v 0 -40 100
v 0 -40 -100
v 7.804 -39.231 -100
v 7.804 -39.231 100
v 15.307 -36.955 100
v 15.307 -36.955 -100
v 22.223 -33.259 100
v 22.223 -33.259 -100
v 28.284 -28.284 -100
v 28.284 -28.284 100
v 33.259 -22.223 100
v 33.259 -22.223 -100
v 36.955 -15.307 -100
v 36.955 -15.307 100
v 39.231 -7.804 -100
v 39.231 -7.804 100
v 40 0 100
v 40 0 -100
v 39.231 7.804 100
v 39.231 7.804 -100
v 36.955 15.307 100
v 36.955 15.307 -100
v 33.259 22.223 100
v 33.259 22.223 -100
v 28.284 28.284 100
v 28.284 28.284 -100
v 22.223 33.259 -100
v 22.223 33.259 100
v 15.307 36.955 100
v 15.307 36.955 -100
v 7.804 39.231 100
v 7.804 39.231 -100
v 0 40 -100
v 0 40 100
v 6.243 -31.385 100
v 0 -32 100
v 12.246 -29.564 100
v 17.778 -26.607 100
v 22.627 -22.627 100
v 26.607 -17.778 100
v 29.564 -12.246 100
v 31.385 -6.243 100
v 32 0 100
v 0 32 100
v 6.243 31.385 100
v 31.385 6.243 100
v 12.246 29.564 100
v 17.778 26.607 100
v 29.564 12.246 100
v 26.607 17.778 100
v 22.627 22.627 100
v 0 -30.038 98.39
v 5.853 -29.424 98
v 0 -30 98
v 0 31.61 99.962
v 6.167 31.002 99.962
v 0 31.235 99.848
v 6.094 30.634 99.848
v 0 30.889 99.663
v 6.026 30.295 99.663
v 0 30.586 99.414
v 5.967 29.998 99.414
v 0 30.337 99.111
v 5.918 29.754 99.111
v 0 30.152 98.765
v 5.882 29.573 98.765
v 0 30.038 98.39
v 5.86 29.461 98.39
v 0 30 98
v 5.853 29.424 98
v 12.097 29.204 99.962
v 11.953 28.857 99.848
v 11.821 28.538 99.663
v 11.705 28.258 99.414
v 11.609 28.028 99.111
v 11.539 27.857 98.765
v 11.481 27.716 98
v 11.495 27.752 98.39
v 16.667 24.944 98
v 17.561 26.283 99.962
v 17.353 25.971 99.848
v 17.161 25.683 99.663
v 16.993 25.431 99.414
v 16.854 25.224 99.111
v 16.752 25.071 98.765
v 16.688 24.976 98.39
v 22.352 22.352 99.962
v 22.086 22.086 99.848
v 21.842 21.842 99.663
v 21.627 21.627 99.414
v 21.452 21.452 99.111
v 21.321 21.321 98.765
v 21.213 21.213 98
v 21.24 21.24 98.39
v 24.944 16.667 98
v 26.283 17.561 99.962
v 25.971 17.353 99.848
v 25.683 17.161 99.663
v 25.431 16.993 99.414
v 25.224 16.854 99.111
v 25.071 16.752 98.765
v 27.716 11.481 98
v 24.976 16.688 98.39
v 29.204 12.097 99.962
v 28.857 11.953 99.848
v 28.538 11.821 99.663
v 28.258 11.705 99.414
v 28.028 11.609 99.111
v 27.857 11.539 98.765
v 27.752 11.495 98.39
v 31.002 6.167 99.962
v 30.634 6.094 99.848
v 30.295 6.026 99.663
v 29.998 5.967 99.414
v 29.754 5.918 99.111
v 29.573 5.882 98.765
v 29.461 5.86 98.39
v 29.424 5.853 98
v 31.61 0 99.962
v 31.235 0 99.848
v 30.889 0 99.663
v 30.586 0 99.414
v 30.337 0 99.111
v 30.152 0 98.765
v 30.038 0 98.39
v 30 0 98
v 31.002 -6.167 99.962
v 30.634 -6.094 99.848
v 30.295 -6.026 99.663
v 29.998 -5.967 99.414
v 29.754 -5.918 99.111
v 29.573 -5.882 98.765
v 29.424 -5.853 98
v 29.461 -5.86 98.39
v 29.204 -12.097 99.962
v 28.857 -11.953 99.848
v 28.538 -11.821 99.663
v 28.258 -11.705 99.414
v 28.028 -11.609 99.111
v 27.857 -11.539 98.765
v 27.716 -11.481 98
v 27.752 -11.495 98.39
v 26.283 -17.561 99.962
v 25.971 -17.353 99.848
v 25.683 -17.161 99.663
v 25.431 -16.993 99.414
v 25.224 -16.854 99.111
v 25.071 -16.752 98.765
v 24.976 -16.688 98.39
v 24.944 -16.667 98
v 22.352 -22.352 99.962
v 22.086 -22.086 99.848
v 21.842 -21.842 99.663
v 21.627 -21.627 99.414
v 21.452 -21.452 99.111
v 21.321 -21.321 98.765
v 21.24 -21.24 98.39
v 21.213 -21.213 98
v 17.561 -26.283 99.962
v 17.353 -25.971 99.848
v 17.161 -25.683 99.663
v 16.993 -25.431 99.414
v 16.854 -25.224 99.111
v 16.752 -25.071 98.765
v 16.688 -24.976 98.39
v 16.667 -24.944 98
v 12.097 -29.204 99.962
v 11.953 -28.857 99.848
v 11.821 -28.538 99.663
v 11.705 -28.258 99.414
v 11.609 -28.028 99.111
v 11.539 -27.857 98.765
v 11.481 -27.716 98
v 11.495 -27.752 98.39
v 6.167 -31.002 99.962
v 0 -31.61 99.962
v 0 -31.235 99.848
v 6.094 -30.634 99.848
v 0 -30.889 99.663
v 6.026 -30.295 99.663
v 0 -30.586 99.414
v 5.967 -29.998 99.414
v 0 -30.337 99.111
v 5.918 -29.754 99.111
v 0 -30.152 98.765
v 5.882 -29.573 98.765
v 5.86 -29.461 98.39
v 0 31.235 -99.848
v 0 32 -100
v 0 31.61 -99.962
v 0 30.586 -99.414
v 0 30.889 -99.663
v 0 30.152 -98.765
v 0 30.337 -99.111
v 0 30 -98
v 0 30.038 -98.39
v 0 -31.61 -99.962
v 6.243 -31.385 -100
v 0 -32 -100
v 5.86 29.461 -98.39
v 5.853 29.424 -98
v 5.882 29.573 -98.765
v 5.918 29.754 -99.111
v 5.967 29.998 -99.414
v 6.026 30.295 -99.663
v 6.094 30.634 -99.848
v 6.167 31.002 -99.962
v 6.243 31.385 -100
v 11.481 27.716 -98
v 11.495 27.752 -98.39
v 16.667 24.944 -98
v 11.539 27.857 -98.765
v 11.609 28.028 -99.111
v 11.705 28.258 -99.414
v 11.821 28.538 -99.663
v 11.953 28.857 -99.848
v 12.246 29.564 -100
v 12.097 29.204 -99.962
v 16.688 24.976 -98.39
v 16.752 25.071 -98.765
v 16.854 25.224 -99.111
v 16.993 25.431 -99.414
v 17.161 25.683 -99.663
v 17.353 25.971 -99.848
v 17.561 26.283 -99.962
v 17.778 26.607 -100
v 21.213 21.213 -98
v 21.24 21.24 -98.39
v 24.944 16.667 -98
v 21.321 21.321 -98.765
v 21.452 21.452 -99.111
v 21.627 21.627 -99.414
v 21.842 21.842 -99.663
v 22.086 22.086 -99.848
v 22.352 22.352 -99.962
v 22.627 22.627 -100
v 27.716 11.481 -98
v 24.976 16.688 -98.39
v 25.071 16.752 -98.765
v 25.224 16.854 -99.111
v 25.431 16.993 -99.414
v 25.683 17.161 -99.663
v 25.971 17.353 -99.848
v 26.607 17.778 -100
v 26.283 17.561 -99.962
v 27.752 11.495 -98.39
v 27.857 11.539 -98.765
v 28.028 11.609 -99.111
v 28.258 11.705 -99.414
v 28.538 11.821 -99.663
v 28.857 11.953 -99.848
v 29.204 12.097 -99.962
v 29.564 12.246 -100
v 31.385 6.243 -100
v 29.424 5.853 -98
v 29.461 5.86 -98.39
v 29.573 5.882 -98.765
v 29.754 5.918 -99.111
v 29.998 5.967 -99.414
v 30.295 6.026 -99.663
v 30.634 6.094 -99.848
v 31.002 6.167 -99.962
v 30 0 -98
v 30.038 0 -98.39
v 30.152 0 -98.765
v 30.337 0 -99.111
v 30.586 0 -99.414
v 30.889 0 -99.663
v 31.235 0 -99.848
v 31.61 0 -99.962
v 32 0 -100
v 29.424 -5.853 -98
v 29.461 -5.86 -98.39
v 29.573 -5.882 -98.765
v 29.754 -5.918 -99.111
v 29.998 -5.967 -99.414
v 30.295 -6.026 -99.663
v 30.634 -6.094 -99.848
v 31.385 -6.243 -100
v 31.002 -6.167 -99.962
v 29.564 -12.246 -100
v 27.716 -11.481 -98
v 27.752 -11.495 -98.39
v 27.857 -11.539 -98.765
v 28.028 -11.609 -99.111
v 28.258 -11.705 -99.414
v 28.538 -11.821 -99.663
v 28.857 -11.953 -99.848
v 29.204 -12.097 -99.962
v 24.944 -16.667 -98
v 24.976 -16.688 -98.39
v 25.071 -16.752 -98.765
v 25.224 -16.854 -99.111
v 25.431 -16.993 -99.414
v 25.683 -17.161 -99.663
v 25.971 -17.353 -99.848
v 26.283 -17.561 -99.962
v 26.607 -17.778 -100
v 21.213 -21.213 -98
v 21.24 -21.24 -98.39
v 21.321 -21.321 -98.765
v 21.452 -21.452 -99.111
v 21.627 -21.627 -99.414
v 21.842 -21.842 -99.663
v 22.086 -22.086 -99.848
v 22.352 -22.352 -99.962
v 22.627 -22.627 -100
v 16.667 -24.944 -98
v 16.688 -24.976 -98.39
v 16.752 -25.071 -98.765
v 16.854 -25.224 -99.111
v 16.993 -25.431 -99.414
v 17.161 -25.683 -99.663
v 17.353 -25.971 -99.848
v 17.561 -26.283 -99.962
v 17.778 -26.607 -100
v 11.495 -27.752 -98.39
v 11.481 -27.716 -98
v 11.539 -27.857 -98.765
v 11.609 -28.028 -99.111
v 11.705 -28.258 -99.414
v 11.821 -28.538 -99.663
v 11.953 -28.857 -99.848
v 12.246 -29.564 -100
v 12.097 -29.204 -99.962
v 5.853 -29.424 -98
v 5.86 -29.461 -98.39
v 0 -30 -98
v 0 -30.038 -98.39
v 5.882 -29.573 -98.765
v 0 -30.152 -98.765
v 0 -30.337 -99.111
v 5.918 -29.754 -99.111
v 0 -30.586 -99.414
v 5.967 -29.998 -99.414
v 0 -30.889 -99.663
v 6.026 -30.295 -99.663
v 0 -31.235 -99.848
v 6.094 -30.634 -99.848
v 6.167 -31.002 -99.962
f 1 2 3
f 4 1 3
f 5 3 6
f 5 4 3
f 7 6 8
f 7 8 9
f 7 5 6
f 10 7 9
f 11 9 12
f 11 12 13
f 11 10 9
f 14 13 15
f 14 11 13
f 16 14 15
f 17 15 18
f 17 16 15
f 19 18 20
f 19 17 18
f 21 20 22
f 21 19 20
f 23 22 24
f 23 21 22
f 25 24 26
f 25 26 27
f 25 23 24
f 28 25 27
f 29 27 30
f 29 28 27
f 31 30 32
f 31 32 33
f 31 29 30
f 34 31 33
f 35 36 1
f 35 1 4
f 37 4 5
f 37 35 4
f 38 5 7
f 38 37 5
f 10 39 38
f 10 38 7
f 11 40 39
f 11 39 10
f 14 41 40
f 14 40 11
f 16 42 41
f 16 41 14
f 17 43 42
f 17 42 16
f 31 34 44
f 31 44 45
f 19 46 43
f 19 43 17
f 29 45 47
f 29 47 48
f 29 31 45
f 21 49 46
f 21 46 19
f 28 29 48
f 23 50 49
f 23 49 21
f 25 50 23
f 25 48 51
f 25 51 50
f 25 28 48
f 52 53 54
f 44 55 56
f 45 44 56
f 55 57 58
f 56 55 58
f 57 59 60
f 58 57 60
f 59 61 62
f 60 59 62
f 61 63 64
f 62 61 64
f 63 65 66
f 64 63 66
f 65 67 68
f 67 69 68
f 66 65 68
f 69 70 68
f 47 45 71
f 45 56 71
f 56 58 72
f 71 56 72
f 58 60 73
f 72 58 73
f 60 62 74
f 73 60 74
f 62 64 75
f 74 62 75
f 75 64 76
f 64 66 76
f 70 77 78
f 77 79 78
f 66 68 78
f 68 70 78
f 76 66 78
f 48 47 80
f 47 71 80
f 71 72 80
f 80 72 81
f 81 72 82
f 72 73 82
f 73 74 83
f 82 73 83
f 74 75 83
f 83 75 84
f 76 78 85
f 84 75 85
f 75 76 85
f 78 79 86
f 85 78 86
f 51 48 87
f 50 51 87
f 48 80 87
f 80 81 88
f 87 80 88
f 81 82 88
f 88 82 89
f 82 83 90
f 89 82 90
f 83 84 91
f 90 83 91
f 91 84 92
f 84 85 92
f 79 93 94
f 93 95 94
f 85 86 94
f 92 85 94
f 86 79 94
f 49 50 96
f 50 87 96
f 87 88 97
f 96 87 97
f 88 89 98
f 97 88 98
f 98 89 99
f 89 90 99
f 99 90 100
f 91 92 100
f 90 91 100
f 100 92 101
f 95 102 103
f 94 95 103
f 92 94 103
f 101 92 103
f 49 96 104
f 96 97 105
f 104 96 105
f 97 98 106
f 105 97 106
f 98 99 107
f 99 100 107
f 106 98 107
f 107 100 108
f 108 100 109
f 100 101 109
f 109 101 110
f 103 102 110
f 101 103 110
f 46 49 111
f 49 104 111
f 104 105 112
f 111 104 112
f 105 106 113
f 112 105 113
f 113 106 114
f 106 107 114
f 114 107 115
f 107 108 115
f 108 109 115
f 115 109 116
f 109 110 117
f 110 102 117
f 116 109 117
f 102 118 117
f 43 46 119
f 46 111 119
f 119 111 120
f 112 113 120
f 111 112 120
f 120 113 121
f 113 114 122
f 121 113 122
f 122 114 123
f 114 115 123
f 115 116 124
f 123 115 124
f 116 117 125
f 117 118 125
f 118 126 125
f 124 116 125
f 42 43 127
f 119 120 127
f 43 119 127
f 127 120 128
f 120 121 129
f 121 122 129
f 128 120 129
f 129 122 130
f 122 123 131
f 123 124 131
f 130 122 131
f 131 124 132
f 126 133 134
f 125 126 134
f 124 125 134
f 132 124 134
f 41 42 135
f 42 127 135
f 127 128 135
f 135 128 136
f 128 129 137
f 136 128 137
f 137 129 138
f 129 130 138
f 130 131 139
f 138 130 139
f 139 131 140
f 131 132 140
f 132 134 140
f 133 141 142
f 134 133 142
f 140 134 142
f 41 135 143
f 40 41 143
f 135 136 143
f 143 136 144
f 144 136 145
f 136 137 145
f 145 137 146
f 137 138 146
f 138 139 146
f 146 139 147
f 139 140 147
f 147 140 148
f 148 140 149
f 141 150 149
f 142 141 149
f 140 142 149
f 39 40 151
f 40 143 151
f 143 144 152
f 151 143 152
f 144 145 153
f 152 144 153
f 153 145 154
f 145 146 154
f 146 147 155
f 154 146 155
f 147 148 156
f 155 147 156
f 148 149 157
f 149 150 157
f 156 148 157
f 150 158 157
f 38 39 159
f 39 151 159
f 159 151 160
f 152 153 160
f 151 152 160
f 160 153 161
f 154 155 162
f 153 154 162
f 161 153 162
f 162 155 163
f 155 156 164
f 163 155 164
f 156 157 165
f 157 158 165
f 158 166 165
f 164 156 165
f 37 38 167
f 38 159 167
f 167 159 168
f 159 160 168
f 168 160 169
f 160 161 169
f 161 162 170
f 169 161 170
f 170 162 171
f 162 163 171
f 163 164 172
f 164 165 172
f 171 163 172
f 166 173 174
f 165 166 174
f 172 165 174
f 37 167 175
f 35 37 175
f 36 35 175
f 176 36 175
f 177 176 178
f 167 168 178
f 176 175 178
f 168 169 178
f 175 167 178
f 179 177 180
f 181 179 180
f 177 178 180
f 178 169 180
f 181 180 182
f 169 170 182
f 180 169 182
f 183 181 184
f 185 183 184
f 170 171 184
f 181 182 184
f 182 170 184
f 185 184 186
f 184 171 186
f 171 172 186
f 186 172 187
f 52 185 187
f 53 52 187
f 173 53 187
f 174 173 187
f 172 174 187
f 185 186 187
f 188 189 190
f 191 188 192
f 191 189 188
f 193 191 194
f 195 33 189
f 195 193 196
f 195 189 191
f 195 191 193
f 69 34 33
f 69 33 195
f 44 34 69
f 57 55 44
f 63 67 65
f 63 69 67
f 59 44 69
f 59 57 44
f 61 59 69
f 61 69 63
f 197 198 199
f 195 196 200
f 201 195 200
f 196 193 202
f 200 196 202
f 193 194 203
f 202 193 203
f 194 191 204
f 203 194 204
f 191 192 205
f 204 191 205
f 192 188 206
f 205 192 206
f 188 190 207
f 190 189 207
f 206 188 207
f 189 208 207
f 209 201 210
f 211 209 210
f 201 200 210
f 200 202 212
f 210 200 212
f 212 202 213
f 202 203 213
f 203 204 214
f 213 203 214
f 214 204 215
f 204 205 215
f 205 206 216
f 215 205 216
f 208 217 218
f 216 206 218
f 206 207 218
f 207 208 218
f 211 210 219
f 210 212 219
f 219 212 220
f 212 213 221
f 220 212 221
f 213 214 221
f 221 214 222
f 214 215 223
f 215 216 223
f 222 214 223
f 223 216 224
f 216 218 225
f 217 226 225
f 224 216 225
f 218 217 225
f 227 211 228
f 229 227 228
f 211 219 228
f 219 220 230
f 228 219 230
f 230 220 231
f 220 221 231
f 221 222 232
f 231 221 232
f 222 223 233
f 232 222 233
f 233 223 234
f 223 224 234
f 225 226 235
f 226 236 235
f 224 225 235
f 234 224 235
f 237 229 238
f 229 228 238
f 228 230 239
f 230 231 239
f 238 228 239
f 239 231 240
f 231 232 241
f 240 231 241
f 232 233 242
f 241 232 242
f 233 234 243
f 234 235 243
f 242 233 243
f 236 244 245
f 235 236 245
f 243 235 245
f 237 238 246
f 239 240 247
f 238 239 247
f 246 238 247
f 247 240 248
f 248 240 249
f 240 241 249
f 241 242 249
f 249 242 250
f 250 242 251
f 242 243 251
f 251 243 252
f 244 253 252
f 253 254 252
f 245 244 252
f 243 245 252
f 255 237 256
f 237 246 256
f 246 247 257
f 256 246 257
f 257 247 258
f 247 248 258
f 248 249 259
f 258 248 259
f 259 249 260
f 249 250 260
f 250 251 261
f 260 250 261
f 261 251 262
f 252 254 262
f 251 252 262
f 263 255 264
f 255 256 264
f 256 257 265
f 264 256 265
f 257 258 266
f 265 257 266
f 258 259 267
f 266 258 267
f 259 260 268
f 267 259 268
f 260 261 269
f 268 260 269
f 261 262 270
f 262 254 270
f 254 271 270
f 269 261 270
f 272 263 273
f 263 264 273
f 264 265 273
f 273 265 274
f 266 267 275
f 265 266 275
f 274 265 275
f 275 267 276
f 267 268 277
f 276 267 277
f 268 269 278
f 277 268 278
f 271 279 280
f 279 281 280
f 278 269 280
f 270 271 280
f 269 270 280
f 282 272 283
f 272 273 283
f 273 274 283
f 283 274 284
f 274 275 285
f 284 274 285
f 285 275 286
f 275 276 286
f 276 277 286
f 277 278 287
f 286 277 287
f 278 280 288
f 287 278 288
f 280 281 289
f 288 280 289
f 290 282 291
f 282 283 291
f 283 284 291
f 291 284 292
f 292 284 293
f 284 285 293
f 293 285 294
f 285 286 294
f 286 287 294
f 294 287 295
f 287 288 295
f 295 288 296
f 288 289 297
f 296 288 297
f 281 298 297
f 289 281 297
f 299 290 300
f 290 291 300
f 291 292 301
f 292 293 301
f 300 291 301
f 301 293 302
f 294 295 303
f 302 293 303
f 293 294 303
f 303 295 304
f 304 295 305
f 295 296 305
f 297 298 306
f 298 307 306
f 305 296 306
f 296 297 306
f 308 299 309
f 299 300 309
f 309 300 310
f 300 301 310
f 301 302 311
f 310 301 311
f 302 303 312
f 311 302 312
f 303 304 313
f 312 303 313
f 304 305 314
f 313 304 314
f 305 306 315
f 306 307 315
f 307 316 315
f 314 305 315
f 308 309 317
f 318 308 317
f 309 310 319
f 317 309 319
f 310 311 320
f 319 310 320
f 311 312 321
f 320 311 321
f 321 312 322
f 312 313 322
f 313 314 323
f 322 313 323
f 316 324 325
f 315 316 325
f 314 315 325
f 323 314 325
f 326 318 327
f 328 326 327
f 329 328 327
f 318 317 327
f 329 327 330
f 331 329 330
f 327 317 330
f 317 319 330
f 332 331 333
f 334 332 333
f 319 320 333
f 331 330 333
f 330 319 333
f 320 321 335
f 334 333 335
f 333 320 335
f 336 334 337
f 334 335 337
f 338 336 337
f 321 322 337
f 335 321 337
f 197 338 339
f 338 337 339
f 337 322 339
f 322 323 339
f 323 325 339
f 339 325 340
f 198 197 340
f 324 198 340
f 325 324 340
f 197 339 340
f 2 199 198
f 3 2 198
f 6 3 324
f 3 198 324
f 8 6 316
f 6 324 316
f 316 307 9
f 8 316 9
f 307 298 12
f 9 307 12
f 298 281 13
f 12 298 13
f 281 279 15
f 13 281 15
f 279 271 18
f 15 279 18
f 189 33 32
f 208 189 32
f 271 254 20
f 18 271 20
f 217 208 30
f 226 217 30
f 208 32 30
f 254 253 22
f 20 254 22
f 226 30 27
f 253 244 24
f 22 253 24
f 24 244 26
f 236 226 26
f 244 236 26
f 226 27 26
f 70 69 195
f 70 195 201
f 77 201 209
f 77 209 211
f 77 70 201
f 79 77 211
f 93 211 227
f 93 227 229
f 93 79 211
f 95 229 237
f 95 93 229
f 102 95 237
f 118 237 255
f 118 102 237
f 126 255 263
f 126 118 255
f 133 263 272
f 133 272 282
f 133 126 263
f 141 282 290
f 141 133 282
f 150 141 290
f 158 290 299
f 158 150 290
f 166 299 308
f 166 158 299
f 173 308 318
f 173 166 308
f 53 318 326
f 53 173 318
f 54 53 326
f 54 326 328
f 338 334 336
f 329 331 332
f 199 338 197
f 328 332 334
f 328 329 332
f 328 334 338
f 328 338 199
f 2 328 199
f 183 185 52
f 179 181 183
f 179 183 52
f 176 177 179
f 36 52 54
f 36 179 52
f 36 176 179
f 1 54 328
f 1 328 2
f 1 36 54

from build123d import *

# Parameters (mm, degrees)
AUFSATZ_LINEAR_AUSTRAGEN1_DEPTH = 100
VERRUNDUNG1_R                   = 2


with BuildPart() as part:
    # Skizze1 → Aufsatz-Linear austragen1 (new, symmetric)
    with BuildSketch(Plane.XY):
        with BuildLine():
            Line((0, 40), (0, 30))
            ThreePointArc((0, 30), (30, 0), (0, -30))
            Line((0, -30), (0, -40))
            ThreePointArc((0, -40), (40, 0), (0, 40))
        make_face()
    extrude(amount=AUFSATZ_LINEAR_AUSTRAGEN1_DEPTH, both=True)

    # Verrundung1
    verrundung1_edges = [part.edges().sort_by_distance(p)[0] for p in [
        (30, 0, 100),
        (30, 0, -100),
    ]]
    fillet(verrundung1_edges, radius=VERRUNDUNG1_R)


solid = part.part
